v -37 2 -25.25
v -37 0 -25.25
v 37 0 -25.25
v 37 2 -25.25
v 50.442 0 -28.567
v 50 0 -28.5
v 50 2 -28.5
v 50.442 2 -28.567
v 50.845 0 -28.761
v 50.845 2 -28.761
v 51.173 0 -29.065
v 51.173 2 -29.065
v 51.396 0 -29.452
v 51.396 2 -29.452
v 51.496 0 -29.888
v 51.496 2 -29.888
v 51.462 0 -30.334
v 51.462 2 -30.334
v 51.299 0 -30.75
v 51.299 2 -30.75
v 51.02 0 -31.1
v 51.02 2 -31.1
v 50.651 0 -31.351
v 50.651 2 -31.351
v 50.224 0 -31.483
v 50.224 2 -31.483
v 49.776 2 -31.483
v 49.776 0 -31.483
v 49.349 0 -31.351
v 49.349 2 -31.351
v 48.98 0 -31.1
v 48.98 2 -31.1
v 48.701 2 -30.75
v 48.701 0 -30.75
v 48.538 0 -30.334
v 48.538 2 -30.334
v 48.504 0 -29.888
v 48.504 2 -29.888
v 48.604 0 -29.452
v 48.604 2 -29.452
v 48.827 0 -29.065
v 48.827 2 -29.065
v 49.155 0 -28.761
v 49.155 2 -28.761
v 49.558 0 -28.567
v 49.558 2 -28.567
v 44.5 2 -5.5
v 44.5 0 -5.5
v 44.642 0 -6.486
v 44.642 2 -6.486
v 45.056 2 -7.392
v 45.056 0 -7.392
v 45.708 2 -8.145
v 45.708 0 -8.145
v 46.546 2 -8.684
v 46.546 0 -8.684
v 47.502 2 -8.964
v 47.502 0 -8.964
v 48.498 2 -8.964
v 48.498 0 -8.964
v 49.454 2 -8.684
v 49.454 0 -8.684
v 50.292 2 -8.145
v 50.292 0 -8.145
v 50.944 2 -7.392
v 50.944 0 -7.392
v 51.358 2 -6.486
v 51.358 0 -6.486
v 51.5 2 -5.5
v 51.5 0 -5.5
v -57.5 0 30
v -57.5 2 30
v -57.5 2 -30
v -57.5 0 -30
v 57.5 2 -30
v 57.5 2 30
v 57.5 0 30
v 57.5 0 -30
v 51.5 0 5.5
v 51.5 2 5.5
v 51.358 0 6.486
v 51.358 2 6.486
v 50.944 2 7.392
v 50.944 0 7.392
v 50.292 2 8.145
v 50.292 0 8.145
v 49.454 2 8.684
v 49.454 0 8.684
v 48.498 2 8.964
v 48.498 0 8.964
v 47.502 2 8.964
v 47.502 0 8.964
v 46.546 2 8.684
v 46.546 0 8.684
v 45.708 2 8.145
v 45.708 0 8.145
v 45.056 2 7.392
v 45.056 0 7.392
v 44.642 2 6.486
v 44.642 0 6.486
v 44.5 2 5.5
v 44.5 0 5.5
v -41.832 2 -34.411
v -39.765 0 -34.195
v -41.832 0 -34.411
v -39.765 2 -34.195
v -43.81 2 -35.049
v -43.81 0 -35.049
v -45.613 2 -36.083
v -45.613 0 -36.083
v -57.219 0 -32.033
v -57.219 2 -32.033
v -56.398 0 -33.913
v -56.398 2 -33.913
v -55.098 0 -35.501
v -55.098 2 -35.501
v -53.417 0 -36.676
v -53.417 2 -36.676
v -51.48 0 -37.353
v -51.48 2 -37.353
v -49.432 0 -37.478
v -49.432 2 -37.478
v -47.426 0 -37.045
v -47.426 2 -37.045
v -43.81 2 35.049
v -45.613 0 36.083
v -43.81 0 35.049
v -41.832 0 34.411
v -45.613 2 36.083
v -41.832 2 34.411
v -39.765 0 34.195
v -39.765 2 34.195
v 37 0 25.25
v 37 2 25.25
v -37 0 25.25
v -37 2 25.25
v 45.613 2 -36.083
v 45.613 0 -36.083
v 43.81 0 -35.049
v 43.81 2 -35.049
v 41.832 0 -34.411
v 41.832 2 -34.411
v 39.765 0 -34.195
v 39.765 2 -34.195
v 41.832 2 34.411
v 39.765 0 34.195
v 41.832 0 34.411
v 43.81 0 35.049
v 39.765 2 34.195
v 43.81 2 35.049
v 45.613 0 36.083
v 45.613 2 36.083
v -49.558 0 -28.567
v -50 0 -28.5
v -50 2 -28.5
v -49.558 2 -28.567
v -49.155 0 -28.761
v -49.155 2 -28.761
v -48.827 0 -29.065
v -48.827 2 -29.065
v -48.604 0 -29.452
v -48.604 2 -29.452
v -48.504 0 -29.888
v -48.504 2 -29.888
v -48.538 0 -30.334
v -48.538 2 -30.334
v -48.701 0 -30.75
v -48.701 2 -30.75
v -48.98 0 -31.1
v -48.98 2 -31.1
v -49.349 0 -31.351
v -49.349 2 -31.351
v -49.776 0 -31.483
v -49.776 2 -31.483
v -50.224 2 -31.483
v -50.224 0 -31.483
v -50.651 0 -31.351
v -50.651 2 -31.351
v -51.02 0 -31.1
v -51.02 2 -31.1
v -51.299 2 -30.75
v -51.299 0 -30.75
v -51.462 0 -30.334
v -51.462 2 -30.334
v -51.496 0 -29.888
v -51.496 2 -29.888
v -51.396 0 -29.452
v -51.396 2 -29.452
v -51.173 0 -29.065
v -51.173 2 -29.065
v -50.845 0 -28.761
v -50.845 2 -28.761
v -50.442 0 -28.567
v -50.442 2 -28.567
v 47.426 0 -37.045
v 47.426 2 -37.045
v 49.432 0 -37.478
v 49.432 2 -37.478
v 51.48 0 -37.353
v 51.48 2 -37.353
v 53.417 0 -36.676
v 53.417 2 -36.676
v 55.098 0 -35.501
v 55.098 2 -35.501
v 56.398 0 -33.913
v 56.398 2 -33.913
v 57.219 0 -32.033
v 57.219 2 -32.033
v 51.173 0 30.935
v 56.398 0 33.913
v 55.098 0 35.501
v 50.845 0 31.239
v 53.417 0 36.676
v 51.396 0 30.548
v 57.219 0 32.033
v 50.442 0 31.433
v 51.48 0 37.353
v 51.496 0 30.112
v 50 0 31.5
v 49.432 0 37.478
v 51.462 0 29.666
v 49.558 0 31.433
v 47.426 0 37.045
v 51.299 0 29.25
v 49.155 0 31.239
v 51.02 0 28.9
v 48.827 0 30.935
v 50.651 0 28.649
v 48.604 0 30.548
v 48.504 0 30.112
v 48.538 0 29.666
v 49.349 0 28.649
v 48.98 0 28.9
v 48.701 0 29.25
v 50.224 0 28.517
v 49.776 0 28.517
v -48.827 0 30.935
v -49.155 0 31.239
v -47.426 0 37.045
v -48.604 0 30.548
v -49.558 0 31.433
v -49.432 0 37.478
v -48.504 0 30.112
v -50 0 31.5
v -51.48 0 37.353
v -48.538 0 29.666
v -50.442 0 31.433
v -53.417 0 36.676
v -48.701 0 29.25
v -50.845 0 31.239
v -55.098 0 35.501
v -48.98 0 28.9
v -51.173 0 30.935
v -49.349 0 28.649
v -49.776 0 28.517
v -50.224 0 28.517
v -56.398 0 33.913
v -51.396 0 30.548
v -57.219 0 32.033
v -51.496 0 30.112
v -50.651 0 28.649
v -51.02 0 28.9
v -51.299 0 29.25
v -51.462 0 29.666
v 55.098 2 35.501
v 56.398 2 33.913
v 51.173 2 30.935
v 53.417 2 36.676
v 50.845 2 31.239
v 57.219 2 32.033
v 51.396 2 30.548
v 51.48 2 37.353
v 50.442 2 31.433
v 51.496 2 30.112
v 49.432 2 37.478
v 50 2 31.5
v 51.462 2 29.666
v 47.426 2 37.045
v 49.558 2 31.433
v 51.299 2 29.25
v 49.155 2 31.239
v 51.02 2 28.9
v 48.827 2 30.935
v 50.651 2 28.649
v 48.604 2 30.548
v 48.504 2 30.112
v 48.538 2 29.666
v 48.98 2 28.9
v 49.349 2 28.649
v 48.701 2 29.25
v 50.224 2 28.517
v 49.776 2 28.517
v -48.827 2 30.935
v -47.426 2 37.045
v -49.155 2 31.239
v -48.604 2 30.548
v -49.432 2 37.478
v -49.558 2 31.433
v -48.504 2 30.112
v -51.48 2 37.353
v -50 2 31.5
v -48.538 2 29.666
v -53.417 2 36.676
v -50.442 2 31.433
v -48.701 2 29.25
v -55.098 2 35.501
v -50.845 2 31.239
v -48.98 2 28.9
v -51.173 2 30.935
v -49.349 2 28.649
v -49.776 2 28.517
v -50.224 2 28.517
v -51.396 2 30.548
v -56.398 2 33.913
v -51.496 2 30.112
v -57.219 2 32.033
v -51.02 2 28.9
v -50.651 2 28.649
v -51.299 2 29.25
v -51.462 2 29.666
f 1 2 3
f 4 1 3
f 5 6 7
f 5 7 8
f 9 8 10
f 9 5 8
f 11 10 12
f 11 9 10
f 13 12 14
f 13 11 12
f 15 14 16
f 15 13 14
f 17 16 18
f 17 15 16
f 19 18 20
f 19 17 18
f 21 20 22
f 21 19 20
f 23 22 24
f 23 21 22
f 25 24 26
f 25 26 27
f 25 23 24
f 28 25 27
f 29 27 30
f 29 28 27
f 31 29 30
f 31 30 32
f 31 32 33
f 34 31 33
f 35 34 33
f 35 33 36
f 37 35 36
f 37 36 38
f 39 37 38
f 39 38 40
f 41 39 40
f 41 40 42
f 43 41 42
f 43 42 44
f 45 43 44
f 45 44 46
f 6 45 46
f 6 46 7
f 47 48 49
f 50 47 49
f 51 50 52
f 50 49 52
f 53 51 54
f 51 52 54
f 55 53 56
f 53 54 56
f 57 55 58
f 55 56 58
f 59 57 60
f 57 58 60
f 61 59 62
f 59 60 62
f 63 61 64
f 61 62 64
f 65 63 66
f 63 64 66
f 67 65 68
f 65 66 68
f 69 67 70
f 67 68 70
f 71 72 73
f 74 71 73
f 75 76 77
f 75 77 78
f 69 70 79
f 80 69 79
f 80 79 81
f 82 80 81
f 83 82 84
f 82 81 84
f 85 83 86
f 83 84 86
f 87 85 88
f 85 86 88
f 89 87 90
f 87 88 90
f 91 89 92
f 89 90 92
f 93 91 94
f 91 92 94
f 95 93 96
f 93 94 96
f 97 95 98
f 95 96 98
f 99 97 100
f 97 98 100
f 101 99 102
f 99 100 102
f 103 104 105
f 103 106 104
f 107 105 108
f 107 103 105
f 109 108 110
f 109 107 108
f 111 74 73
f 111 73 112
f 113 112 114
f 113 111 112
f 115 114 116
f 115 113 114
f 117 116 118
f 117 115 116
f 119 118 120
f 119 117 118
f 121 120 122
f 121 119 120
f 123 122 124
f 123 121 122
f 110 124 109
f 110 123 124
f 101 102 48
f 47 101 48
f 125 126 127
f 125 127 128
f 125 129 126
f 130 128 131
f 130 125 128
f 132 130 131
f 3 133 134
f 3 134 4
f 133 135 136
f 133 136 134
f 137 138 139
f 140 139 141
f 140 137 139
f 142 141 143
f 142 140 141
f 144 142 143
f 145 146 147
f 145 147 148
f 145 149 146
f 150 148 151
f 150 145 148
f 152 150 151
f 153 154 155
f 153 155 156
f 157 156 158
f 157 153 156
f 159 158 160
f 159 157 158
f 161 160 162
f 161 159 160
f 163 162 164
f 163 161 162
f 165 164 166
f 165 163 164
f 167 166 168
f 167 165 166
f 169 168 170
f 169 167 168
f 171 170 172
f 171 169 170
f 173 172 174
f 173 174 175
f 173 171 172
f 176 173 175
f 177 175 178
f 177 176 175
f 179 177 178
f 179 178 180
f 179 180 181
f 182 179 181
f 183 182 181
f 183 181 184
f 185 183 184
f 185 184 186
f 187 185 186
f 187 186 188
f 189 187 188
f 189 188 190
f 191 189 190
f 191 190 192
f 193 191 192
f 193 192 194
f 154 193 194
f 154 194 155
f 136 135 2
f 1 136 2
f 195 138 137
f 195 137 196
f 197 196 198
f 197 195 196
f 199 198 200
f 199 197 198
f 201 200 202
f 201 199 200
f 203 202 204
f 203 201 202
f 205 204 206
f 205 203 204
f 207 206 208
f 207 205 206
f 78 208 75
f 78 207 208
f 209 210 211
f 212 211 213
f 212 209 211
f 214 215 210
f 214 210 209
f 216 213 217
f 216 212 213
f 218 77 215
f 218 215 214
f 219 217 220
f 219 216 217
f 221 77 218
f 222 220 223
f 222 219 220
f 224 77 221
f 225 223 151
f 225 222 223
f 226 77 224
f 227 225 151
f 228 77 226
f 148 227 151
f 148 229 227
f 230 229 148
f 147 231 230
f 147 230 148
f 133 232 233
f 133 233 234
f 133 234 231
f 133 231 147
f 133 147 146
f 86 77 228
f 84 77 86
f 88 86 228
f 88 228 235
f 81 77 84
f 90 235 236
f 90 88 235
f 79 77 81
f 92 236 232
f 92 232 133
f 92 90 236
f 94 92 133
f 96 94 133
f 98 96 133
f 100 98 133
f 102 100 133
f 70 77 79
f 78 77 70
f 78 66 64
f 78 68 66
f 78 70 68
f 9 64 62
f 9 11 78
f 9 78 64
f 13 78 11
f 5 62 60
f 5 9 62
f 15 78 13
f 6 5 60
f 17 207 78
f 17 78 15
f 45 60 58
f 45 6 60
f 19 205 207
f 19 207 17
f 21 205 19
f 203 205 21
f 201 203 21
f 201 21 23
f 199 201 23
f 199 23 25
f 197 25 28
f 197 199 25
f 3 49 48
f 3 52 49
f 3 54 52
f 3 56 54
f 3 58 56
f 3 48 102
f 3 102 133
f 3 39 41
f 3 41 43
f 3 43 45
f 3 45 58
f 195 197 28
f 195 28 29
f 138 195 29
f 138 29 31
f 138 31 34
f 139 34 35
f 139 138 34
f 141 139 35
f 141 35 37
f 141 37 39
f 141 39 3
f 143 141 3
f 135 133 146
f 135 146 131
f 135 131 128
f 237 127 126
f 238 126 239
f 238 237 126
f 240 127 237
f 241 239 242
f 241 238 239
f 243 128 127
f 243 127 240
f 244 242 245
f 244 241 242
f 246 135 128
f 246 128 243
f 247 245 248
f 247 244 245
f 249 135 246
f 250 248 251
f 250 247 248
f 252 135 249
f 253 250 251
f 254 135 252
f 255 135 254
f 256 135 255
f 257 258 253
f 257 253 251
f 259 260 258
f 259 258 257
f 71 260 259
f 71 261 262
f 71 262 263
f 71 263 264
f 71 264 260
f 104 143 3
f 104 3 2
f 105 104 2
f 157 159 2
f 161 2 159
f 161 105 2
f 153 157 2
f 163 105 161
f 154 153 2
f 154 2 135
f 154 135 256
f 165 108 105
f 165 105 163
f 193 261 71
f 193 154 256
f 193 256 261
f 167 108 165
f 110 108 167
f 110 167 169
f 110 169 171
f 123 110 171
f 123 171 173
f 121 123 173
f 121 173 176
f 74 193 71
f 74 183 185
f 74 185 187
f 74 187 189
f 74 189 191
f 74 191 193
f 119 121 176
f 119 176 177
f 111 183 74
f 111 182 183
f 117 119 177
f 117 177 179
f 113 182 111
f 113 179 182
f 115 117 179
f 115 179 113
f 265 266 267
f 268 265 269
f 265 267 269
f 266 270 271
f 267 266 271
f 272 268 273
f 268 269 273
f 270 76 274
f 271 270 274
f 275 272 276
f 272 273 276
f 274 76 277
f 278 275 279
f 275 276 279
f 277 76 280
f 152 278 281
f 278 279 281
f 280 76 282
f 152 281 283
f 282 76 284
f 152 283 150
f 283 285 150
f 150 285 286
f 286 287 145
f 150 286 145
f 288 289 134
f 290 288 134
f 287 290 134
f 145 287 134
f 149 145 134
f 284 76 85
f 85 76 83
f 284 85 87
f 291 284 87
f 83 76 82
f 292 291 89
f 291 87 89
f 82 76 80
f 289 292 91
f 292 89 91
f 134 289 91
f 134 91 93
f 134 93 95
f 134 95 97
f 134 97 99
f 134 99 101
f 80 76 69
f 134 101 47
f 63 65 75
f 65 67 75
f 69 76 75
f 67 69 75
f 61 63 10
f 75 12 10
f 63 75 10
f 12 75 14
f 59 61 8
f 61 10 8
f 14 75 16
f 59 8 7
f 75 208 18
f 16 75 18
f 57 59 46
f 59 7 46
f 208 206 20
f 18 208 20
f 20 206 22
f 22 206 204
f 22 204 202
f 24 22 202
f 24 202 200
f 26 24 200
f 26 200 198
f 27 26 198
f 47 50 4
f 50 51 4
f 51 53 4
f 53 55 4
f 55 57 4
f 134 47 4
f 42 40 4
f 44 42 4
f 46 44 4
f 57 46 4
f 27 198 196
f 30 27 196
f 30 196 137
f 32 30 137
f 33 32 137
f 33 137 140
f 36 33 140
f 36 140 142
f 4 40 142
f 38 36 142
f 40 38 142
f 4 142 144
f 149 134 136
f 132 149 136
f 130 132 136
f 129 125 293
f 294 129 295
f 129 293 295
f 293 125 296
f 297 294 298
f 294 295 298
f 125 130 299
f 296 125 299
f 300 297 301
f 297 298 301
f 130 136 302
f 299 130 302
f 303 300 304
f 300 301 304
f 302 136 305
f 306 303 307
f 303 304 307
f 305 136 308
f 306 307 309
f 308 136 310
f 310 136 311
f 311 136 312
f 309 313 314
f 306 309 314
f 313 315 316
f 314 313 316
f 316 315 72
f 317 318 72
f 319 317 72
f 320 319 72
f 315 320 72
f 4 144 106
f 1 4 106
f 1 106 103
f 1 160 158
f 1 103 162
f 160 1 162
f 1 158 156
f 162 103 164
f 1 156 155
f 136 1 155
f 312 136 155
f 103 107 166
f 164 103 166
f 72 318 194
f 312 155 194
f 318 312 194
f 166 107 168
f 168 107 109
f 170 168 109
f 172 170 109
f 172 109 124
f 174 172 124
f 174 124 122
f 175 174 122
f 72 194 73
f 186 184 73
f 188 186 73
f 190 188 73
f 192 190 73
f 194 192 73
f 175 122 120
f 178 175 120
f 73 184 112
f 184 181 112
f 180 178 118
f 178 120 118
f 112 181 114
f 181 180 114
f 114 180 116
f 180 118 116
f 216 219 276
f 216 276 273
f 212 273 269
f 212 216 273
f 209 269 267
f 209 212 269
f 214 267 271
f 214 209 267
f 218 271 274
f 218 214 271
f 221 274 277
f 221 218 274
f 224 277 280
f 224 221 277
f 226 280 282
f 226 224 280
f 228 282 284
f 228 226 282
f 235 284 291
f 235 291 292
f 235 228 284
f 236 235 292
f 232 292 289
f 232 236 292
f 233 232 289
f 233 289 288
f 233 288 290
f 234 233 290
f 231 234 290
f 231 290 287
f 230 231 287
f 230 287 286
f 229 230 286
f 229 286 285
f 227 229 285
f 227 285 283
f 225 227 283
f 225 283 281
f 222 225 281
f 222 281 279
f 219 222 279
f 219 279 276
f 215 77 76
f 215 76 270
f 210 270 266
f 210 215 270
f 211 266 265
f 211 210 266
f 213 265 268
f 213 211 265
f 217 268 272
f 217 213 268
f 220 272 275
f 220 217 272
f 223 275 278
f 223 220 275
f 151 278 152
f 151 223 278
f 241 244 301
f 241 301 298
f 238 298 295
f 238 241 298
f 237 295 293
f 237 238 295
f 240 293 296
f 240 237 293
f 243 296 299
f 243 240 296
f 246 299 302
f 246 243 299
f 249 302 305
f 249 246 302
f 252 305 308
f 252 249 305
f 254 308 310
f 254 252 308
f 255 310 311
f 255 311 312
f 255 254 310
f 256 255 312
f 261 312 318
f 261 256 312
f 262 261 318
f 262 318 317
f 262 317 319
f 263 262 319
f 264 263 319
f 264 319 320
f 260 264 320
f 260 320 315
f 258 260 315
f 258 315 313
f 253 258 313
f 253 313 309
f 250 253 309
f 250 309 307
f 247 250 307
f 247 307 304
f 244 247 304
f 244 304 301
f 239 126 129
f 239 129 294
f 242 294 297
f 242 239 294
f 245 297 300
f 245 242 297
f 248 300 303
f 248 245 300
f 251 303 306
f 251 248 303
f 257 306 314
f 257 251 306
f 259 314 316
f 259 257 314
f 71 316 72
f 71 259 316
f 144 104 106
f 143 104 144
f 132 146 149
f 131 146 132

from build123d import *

# Parameters (mm, degrees)
SKETCH2_R           = 1.5
SKETCH2_W           = 74
SKETCH2_H           = 50.5
BOSS_EXTRUDE1_DEPTH = 2
SKETCH4_W           = 6
SKETCH4_H           = 60
BOSS_EXTRUDE3_DEPTH = 2
FILLET1_R           = 10


with BuildPart() as part:
    # Sketch2 → Boss-Extrude1 (new body)
    with BuildSketch(Plane(origin=(0, 0, 0), x_dir=(1, 0, 0), z_dir=(0, 1, 0))):
        with BuildLine():
            Line((-43.782705459, 34.194669068), (43.782705459, 34.194669068))
            ThreePointArc((43.782705459, 34.194669068), (55.303300859, 35.303300859), (54.194669068, 23.782705459))
            Line((54.194669068, 23.782705459), (54.194669068, -23.782705459))
            ThreePointArc((54.194669068, -23.782705459), (55.303300859, -35.303300859), (43.782705459, -34.194669068))
            Line((43.782705459, -34.194669068), (-43.782705459, -34.194669068))
            ThreePointArc((-43.782705459, -34.194669068), (-55.303300859, -35.303300859), (-54.194669068, -23.782705459))
            Line((-54.194669068, -23.782705459), (-54.194669068, 23.782705459))
            ThreePointArc((-54.194669068, 23.782705459), (-55.303300859, 35.303300859), (-43.782705459, 34.194669068))
        make_face()
        with Locations(Location((-50, -30, 0), (0, 0, 270))):
            Circle(SKETCH2_R, mode=Mode.SUBTRACT)
        with Locations(Location((50, -30, 0), (0, 0, 270))):
            Circle(SKETCH2_R, mode=Mode.SUBTRACT)
        with Locations(Location((-50, 30, 0), (0, 0, 270))):
            Circle(SKETCH2_R, mode=Mode.SUBTRACT)
        with Locations(Location((50, 30, 0), (0, 0, 270))):
            Circle(SKETCH2_R, mode=Mode.SUBTRACT)
        Rectangle(SKETCH2_W, SKETCH2_H, mode=Mode.SUBTRACT)
        with BuildLine():
            Line((51.5, 5.5), (51.5, -5.5))
            ThreePointArc((51.5, -5.5), (48, -9), (44.5, -5.5))
            Line((44.5, -5.5), (44.5, 5.5))
            ThreePointArc((44.5, 5.5), (48, 9), (51.5, 5.5))
        make_face(mode=Mode.SUBTRACT)
    extrude(amount=BOSS_EXTRUDE1_DEPTH)

    # Sketch4 → Boss-Extrude3 (add, through all)
    with BuildSketch(Plane(origin=(0, 2, 0), x_dir=(1, 0, 0), z_dir=(0, 1, 0))):
        with Locations((54.5, 0)):
            Rectangle(SKETCH4_W, SKETCH4_H)
    boss_extrude3 = extrude(amount=-BOSS_EXTRUDE3_DEPTH)

    # Mirror1: Boss-Extrude3 across plane
    add(boss_extrude3.mirror(Plane(origin=(0, 0, 0), x_dir=(0, 0, 1), z_dir=(1, 0, 0))))

    # Fillet1
    fillet1_edges = [part.edges().sort_by_distance(p)[0] for p in [
        (-43.782705459, 1, -34.194669068),
        (43.782705459, 1, -34.194669068),
        (43.782705459, 1, 34.194669068),
        (-43.782705459, 1, 34.194669068),
    ]]
    fillet(fillet1_edges, radius=FILLET1_R)


solid = part.part
